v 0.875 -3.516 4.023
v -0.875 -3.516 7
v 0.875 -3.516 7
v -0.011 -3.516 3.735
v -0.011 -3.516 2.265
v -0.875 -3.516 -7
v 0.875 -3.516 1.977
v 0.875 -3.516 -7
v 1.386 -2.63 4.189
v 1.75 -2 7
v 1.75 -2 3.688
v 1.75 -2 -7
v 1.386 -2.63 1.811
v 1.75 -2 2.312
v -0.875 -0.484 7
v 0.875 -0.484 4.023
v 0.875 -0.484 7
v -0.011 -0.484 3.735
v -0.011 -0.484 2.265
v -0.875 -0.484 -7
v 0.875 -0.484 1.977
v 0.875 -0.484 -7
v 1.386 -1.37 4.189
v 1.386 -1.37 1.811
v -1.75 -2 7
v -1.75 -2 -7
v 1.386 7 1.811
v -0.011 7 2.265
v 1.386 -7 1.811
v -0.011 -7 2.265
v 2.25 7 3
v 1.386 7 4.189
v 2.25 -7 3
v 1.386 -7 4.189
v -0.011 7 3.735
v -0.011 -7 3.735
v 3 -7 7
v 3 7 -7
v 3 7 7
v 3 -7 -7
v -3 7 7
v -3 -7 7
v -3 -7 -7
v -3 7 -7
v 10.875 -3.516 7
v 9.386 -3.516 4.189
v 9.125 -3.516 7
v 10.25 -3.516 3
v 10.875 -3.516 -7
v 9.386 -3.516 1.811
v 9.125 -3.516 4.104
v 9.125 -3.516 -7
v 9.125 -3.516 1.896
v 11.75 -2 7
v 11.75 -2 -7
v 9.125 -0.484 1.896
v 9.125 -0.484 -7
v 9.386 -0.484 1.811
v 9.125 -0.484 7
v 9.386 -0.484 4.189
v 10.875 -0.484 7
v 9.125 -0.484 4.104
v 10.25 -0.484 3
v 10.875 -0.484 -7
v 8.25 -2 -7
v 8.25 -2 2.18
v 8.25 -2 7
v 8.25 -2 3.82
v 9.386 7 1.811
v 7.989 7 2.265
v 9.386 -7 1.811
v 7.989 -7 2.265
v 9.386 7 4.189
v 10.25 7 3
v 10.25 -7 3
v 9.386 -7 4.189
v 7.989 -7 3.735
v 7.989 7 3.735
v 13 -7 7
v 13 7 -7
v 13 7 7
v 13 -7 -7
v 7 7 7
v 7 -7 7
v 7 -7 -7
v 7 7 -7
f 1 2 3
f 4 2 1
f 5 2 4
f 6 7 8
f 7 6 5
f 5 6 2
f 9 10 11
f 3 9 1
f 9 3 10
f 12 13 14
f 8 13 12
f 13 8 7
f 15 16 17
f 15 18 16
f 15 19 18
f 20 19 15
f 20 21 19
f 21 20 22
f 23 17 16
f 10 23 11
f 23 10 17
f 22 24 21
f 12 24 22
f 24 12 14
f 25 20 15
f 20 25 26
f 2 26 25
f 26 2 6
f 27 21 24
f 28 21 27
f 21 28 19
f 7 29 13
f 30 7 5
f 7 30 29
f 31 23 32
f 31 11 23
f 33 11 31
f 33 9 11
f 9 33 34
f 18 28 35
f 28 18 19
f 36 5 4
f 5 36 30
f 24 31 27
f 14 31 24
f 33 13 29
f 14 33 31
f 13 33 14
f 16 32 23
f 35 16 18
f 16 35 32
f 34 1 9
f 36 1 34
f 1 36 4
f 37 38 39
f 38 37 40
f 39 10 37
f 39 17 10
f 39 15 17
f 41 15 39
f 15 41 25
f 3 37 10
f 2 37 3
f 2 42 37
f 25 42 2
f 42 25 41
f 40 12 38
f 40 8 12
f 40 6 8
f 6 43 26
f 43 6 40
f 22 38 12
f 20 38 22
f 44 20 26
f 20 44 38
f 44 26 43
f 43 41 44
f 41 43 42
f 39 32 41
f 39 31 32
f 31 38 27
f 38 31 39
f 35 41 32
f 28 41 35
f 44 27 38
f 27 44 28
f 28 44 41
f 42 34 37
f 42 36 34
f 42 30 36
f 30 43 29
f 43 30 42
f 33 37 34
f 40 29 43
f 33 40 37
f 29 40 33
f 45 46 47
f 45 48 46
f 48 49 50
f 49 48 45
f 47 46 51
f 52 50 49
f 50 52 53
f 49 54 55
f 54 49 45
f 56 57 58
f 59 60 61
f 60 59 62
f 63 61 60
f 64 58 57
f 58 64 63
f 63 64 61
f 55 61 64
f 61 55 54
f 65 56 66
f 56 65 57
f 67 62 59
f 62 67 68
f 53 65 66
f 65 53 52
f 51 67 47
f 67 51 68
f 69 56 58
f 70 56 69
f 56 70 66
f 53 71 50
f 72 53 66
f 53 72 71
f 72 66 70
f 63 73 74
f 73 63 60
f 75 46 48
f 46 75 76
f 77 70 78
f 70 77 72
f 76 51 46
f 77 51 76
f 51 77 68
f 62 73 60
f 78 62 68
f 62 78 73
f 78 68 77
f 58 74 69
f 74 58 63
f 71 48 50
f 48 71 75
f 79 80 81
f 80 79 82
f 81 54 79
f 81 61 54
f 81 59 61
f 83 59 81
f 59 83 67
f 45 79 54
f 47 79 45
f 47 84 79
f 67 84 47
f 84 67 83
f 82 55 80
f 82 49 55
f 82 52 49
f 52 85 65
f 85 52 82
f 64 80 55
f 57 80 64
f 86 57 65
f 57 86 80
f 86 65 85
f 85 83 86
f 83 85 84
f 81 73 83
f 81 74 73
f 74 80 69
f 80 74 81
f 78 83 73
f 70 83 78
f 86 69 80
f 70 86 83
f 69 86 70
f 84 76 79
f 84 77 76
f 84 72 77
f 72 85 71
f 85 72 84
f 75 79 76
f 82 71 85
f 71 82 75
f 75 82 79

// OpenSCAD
// file: settings.scad
baseWidth = 70;
baseRadius = baseWidth / 2;
baseHeight = 3;
wheelCutDepth = 10;
wheelCutSize = 50;
motorWidth = 12;
motorHeight = 10;
motorLength = 23;
motorScrewSize = 4;

//rail
railDiameter=5.5;
railWidth=24;
railPos=28;

screwSize=4;
railSize=5;
screwSpace=2;
mountHeight=3;
railBlockLength=railSize+2*screwSpace;
screwAreaLength=screwSize+2*screwSpace;
topLength=2*railBlockLength+screwAreaLength;
mountItemSize=screwAreaLength;

servoWidth=25;
servoDepth=13;
servoOffset=6;
// main file
include <settings.scad>
use <parts-lib.scad>

camServoMount();
